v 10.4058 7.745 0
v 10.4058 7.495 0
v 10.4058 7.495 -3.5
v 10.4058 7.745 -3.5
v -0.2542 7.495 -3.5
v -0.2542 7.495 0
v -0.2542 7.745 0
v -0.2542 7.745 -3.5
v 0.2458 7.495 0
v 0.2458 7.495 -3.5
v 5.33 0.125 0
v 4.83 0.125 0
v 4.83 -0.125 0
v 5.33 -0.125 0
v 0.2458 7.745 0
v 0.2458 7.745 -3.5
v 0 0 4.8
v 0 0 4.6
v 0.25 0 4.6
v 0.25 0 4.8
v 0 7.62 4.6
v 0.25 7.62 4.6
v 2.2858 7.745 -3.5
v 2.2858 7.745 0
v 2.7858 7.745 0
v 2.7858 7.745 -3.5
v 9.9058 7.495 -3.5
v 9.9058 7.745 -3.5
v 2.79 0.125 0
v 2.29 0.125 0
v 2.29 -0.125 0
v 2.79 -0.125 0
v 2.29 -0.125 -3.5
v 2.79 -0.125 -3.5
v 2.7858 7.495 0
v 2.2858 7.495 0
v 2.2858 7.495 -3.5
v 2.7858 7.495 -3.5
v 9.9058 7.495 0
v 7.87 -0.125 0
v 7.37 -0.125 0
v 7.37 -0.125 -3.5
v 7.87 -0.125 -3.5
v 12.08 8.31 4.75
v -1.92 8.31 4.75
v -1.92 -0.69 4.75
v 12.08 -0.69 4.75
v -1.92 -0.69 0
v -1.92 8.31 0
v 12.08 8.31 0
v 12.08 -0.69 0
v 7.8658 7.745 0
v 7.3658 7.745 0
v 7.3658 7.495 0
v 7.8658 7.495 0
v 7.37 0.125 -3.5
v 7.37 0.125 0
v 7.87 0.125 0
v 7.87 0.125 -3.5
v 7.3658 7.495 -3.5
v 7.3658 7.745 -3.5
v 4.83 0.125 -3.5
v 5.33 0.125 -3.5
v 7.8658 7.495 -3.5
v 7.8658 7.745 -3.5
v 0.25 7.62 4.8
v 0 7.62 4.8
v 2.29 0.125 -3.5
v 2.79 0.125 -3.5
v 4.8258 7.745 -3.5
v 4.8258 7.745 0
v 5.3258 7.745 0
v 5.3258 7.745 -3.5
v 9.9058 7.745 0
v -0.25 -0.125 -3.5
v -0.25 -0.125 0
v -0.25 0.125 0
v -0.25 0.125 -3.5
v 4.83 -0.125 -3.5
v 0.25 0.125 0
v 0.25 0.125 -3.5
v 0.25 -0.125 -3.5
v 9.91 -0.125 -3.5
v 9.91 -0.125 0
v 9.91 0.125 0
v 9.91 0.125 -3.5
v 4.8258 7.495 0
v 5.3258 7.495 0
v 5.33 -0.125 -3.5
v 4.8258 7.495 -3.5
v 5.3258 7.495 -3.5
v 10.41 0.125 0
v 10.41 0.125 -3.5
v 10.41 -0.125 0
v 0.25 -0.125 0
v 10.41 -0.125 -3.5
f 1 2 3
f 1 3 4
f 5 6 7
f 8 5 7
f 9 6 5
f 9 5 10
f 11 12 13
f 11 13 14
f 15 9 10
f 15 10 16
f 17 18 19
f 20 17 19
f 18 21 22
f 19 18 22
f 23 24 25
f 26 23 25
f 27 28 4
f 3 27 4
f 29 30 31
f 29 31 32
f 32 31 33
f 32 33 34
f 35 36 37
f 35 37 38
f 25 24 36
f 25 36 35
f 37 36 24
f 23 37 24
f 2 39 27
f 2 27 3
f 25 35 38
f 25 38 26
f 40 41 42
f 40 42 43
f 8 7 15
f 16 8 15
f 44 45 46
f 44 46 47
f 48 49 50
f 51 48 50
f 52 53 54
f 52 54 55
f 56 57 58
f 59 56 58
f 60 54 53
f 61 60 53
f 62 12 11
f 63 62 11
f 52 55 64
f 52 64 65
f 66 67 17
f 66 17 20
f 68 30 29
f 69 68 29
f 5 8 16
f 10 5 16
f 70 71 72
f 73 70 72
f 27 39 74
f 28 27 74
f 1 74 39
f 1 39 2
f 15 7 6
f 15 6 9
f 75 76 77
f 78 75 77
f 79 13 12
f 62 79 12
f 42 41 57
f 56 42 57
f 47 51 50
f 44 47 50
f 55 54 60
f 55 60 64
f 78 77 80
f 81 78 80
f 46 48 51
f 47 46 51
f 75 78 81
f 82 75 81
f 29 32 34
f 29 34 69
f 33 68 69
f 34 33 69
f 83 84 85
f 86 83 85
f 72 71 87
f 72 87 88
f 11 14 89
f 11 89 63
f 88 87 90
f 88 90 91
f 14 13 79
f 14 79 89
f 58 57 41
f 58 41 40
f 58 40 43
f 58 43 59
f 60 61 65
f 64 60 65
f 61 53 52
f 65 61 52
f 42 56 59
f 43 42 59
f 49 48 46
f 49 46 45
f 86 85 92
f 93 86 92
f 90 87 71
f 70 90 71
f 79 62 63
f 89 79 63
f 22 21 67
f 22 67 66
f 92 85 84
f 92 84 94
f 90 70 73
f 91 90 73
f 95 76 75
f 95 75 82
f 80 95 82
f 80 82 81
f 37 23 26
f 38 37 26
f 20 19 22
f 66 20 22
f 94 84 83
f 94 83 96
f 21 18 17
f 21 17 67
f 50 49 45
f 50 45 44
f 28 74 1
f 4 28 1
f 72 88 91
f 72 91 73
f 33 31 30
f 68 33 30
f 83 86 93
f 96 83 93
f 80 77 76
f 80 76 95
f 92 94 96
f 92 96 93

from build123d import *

# Parameters (mm, degrees)
SKETCH_W     = 14
SKETCH_H     = 9
PAD_DEPTH    = 4.75
SKETCH001_W  = 0.25
SKETCH001_H  = 7.62
PAD001_DEPTH = 0.2
SKETCH002_W  = 0.5
SKETCH002_H  = 0.25
PAD002_DEPTH = 3.5


with BuildPart() as pad:
    # Sketch → Pad (new body)
    with BuildSketch(Plane.XY):
        with Locations((5.08, 3.81)):
            Rectangle(SKETCH_W, SKETCH_H)
    extrude(amount=PAD_DEPTH)


with BuildPart() as pad001:
    # Sketch001 → Pad001 (new body)
    with BuildSketch(Plane.XY.offset(4.6)):
        with Locations((0.125, 3.81)):
            Rectangle(SKETCH001_W, SKETCH001_H)
    extrude(amount=PAD001_DEPTH)


with BuildPart() as pad002:
    # Sketch002 → Pad002 (new body)
    with BuildSketch(Plane.XY):
        Rectangle(SKETCH002_W, SKETCH002_H)
        with Locations((2.54, 0)):
            Rectangle(SKETCH002_W, SKETCH002_H)
        with Locations((5.08, 0)):
            Rectangle(SKETCH002_W, SKETCH002_H)
        with Locations((7.62, 0)):
            Rectangle(SKETCH002_W, SKETCH002_H)
        with Locations((10.16, 0)):
            Rectangle(SKETCH002_W, SKETCH002_H)
        with Locations((-0.004201, 7.62)):
            Rectangle(SKETCH002_W, SKETCH002_H)
        with Locations((2.535799, 7.62)):
            Rectangle(SKETCH002_W, SKETCH002_H)
        with Locations((5.075799, 7.62)):
            Rectangle(SKETCH002_W, SKETCH002_H)
        with Locations((7.615799, 7.62)):
            Rectangle(SKETCH002_W, SKETCH002_H)
        with Locations((10.155799, 7.62)):
            Rectangle(SKETCH002_W, SKETCH002_H)
    extrude(amount=-PAD002_DEPTH)


solid = Compound([pad.part, pad001.part, pad002.part])
